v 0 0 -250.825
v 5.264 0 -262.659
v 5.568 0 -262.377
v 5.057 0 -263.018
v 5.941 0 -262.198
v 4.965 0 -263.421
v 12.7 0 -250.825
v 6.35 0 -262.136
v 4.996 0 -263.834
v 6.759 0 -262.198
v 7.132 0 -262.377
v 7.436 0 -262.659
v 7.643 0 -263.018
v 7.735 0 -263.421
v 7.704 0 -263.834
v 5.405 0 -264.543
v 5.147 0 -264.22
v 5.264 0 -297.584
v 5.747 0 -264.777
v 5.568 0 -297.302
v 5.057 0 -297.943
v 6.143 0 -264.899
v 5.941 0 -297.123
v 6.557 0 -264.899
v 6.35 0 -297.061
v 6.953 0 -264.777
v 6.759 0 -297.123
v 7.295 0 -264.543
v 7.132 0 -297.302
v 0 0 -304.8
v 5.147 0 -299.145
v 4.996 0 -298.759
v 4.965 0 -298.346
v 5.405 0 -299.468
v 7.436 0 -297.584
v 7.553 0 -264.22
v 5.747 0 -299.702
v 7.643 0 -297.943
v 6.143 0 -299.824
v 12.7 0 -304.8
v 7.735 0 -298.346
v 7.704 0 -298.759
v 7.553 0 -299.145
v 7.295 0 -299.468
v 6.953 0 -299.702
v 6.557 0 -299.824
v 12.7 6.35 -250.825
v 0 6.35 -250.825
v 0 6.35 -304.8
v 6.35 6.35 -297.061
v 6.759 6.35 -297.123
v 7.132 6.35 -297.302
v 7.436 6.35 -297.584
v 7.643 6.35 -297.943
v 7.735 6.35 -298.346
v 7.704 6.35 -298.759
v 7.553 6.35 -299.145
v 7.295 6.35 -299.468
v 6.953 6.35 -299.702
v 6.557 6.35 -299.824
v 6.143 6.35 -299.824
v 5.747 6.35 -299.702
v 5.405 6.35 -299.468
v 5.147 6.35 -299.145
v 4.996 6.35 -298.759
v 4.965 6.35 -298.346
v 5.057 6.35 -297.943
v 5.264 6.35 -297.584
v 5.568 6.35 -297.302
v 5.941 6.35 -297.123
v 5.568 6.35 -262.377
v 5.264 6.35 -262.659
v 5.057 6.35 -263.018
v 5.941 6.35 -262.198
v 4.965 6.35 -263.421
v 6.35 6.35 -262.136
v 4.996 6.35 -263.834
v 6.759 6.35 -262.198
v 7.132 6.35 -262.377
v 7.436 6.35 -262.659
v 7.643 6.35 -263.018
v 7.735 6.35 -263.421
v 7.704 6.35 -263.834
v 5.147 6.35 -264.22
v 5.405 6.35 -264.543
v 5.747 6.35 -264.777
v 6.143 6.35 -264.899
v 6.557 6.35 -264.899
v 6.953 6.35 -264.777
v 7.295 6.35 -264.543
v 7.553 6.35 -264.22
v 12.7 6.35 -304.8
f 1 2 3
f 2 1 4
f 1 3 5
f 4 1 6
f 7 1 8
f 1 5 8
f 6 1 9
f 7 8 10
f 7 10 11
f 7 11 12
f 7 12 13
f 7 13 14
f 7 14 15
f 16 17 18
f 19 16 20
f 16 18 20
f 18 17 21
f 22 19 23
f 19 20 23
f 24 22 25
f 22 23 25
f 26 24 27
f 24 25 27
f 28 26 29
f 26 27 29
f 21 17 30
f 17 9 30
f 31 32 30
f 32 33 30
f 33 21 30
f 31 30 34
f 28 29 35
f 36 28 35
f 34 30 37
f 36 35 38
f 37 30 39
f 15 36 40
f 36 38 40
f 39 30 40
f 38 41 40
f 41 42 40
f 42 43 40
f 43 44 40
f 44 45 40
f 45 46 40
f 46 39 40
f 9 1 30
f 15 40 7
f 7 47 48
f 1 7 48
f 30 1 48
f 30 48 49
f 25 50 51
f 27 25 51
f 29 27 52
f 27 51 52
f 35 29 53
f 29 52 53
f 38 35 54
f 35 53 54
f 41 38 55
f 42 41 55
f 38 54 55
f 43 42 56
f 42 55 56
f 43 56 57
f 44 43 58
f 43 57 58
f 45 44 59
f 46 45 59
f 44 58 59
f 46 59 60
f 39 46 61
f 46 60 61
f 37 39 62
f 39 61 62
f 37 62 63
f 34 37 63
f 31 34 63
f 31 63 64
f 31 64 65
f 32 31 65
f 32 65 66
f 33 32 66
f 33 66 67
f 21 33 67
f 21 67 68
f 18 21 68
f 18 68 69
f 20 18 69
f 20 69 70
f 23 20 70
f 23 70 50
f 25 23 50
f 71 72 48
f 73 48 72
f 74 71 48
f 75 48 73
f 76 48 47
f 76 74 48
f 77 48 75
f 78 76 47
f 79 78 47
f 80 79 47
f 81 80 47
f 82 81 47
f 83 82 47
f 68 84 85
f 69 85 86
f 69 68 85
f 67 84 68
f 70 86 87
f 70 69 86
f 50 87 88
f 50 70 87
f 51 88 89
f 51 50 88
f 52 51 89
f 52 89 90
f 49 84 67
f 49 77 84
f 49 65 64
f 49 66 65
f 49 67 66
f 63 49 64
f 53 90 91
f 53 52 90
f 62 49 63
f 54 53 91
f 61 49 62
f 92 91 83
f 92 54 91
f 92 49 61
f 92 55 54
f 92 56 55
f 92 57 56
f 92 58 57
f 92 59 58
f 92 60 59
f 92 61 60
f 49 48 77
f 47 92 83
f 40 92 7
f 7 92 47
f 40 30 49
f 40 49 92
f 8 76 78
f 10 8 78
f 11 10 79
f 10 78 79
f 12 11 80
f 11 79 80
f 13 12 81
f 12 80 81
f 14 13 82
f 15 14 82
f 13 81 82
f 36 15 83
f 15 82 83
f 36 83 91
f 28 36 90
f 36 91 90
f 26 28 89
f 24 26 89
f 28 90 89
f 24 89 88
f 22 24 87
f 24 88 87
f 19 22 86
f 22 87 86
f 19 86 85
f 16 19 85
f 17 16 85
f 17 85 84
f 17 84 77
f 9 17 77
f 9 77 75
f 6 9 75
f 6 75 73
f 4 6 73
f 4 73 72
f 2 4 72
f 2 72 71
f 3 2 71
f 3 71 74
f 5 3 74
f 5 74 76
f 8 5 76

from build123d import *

# Parameters (mm, degrees)
SKETCH1_W           = 304.8
SKETCH1_H           = 304.8
BOSS_EXTRUDE1_DEPTH = 6.35
CUT_EXTRUDE2_DEPTH  = 6.35
SKETCH3_R           = 1.3890625
CUT_EXTRUDE3_DEPTH  = 306.130549929


with BuildPart() as part:
    # Sketch1 → Boss-Extrude1 (new body)
    with BuildSketch(Plane(origin=(0, 0, 0), x_dir=(1, 0, 0), z_dir=(0, 1, 0))):
        with Locations((152.4, 152.4)):
            Rectangle(SKETCH1_W, SKETCH1_H)
    extrude(amount=BOSS_EXTRUDE1_DEPTH)

    # Sketch2 → Cut-Extrude2 (cut)
    with BuildSketch(Plane(origin=(0, 6.35, 0), x_dir=(1, 0, 0), z_dir=(0, 1, 0))):
        Polygon((12.7, 304.8), (12.7, 250.825), (0, 250.825), (0, 0), (304.8, 0), (304.8, 304.8), align=None)
    extrude(amount=-CUT_EXTRUDE2_DEPTH, mode=Mode.SUBTRACT)

    # Sketch3 → Cut-Extrude3 (cut, through all)
    with BuildSketch(Plane(origin=(0, 6.35, 0), x_dir=(1, 0, 0), z_dir=(0, 1, 0))):
        with Locations(Location((6.35, 263.525, 0), (0, 0, 270))):
            Circle(SKETCH3_R)
        with Locations(Location((6.35, 298.45, 0), (0, 0, 270))):
            Circle(SKETCH3_R)
    extrude(amount=-CUT_EXTRUDE3_DEPTH, mode=Mode.SUBTRACT)


solid = part.part
